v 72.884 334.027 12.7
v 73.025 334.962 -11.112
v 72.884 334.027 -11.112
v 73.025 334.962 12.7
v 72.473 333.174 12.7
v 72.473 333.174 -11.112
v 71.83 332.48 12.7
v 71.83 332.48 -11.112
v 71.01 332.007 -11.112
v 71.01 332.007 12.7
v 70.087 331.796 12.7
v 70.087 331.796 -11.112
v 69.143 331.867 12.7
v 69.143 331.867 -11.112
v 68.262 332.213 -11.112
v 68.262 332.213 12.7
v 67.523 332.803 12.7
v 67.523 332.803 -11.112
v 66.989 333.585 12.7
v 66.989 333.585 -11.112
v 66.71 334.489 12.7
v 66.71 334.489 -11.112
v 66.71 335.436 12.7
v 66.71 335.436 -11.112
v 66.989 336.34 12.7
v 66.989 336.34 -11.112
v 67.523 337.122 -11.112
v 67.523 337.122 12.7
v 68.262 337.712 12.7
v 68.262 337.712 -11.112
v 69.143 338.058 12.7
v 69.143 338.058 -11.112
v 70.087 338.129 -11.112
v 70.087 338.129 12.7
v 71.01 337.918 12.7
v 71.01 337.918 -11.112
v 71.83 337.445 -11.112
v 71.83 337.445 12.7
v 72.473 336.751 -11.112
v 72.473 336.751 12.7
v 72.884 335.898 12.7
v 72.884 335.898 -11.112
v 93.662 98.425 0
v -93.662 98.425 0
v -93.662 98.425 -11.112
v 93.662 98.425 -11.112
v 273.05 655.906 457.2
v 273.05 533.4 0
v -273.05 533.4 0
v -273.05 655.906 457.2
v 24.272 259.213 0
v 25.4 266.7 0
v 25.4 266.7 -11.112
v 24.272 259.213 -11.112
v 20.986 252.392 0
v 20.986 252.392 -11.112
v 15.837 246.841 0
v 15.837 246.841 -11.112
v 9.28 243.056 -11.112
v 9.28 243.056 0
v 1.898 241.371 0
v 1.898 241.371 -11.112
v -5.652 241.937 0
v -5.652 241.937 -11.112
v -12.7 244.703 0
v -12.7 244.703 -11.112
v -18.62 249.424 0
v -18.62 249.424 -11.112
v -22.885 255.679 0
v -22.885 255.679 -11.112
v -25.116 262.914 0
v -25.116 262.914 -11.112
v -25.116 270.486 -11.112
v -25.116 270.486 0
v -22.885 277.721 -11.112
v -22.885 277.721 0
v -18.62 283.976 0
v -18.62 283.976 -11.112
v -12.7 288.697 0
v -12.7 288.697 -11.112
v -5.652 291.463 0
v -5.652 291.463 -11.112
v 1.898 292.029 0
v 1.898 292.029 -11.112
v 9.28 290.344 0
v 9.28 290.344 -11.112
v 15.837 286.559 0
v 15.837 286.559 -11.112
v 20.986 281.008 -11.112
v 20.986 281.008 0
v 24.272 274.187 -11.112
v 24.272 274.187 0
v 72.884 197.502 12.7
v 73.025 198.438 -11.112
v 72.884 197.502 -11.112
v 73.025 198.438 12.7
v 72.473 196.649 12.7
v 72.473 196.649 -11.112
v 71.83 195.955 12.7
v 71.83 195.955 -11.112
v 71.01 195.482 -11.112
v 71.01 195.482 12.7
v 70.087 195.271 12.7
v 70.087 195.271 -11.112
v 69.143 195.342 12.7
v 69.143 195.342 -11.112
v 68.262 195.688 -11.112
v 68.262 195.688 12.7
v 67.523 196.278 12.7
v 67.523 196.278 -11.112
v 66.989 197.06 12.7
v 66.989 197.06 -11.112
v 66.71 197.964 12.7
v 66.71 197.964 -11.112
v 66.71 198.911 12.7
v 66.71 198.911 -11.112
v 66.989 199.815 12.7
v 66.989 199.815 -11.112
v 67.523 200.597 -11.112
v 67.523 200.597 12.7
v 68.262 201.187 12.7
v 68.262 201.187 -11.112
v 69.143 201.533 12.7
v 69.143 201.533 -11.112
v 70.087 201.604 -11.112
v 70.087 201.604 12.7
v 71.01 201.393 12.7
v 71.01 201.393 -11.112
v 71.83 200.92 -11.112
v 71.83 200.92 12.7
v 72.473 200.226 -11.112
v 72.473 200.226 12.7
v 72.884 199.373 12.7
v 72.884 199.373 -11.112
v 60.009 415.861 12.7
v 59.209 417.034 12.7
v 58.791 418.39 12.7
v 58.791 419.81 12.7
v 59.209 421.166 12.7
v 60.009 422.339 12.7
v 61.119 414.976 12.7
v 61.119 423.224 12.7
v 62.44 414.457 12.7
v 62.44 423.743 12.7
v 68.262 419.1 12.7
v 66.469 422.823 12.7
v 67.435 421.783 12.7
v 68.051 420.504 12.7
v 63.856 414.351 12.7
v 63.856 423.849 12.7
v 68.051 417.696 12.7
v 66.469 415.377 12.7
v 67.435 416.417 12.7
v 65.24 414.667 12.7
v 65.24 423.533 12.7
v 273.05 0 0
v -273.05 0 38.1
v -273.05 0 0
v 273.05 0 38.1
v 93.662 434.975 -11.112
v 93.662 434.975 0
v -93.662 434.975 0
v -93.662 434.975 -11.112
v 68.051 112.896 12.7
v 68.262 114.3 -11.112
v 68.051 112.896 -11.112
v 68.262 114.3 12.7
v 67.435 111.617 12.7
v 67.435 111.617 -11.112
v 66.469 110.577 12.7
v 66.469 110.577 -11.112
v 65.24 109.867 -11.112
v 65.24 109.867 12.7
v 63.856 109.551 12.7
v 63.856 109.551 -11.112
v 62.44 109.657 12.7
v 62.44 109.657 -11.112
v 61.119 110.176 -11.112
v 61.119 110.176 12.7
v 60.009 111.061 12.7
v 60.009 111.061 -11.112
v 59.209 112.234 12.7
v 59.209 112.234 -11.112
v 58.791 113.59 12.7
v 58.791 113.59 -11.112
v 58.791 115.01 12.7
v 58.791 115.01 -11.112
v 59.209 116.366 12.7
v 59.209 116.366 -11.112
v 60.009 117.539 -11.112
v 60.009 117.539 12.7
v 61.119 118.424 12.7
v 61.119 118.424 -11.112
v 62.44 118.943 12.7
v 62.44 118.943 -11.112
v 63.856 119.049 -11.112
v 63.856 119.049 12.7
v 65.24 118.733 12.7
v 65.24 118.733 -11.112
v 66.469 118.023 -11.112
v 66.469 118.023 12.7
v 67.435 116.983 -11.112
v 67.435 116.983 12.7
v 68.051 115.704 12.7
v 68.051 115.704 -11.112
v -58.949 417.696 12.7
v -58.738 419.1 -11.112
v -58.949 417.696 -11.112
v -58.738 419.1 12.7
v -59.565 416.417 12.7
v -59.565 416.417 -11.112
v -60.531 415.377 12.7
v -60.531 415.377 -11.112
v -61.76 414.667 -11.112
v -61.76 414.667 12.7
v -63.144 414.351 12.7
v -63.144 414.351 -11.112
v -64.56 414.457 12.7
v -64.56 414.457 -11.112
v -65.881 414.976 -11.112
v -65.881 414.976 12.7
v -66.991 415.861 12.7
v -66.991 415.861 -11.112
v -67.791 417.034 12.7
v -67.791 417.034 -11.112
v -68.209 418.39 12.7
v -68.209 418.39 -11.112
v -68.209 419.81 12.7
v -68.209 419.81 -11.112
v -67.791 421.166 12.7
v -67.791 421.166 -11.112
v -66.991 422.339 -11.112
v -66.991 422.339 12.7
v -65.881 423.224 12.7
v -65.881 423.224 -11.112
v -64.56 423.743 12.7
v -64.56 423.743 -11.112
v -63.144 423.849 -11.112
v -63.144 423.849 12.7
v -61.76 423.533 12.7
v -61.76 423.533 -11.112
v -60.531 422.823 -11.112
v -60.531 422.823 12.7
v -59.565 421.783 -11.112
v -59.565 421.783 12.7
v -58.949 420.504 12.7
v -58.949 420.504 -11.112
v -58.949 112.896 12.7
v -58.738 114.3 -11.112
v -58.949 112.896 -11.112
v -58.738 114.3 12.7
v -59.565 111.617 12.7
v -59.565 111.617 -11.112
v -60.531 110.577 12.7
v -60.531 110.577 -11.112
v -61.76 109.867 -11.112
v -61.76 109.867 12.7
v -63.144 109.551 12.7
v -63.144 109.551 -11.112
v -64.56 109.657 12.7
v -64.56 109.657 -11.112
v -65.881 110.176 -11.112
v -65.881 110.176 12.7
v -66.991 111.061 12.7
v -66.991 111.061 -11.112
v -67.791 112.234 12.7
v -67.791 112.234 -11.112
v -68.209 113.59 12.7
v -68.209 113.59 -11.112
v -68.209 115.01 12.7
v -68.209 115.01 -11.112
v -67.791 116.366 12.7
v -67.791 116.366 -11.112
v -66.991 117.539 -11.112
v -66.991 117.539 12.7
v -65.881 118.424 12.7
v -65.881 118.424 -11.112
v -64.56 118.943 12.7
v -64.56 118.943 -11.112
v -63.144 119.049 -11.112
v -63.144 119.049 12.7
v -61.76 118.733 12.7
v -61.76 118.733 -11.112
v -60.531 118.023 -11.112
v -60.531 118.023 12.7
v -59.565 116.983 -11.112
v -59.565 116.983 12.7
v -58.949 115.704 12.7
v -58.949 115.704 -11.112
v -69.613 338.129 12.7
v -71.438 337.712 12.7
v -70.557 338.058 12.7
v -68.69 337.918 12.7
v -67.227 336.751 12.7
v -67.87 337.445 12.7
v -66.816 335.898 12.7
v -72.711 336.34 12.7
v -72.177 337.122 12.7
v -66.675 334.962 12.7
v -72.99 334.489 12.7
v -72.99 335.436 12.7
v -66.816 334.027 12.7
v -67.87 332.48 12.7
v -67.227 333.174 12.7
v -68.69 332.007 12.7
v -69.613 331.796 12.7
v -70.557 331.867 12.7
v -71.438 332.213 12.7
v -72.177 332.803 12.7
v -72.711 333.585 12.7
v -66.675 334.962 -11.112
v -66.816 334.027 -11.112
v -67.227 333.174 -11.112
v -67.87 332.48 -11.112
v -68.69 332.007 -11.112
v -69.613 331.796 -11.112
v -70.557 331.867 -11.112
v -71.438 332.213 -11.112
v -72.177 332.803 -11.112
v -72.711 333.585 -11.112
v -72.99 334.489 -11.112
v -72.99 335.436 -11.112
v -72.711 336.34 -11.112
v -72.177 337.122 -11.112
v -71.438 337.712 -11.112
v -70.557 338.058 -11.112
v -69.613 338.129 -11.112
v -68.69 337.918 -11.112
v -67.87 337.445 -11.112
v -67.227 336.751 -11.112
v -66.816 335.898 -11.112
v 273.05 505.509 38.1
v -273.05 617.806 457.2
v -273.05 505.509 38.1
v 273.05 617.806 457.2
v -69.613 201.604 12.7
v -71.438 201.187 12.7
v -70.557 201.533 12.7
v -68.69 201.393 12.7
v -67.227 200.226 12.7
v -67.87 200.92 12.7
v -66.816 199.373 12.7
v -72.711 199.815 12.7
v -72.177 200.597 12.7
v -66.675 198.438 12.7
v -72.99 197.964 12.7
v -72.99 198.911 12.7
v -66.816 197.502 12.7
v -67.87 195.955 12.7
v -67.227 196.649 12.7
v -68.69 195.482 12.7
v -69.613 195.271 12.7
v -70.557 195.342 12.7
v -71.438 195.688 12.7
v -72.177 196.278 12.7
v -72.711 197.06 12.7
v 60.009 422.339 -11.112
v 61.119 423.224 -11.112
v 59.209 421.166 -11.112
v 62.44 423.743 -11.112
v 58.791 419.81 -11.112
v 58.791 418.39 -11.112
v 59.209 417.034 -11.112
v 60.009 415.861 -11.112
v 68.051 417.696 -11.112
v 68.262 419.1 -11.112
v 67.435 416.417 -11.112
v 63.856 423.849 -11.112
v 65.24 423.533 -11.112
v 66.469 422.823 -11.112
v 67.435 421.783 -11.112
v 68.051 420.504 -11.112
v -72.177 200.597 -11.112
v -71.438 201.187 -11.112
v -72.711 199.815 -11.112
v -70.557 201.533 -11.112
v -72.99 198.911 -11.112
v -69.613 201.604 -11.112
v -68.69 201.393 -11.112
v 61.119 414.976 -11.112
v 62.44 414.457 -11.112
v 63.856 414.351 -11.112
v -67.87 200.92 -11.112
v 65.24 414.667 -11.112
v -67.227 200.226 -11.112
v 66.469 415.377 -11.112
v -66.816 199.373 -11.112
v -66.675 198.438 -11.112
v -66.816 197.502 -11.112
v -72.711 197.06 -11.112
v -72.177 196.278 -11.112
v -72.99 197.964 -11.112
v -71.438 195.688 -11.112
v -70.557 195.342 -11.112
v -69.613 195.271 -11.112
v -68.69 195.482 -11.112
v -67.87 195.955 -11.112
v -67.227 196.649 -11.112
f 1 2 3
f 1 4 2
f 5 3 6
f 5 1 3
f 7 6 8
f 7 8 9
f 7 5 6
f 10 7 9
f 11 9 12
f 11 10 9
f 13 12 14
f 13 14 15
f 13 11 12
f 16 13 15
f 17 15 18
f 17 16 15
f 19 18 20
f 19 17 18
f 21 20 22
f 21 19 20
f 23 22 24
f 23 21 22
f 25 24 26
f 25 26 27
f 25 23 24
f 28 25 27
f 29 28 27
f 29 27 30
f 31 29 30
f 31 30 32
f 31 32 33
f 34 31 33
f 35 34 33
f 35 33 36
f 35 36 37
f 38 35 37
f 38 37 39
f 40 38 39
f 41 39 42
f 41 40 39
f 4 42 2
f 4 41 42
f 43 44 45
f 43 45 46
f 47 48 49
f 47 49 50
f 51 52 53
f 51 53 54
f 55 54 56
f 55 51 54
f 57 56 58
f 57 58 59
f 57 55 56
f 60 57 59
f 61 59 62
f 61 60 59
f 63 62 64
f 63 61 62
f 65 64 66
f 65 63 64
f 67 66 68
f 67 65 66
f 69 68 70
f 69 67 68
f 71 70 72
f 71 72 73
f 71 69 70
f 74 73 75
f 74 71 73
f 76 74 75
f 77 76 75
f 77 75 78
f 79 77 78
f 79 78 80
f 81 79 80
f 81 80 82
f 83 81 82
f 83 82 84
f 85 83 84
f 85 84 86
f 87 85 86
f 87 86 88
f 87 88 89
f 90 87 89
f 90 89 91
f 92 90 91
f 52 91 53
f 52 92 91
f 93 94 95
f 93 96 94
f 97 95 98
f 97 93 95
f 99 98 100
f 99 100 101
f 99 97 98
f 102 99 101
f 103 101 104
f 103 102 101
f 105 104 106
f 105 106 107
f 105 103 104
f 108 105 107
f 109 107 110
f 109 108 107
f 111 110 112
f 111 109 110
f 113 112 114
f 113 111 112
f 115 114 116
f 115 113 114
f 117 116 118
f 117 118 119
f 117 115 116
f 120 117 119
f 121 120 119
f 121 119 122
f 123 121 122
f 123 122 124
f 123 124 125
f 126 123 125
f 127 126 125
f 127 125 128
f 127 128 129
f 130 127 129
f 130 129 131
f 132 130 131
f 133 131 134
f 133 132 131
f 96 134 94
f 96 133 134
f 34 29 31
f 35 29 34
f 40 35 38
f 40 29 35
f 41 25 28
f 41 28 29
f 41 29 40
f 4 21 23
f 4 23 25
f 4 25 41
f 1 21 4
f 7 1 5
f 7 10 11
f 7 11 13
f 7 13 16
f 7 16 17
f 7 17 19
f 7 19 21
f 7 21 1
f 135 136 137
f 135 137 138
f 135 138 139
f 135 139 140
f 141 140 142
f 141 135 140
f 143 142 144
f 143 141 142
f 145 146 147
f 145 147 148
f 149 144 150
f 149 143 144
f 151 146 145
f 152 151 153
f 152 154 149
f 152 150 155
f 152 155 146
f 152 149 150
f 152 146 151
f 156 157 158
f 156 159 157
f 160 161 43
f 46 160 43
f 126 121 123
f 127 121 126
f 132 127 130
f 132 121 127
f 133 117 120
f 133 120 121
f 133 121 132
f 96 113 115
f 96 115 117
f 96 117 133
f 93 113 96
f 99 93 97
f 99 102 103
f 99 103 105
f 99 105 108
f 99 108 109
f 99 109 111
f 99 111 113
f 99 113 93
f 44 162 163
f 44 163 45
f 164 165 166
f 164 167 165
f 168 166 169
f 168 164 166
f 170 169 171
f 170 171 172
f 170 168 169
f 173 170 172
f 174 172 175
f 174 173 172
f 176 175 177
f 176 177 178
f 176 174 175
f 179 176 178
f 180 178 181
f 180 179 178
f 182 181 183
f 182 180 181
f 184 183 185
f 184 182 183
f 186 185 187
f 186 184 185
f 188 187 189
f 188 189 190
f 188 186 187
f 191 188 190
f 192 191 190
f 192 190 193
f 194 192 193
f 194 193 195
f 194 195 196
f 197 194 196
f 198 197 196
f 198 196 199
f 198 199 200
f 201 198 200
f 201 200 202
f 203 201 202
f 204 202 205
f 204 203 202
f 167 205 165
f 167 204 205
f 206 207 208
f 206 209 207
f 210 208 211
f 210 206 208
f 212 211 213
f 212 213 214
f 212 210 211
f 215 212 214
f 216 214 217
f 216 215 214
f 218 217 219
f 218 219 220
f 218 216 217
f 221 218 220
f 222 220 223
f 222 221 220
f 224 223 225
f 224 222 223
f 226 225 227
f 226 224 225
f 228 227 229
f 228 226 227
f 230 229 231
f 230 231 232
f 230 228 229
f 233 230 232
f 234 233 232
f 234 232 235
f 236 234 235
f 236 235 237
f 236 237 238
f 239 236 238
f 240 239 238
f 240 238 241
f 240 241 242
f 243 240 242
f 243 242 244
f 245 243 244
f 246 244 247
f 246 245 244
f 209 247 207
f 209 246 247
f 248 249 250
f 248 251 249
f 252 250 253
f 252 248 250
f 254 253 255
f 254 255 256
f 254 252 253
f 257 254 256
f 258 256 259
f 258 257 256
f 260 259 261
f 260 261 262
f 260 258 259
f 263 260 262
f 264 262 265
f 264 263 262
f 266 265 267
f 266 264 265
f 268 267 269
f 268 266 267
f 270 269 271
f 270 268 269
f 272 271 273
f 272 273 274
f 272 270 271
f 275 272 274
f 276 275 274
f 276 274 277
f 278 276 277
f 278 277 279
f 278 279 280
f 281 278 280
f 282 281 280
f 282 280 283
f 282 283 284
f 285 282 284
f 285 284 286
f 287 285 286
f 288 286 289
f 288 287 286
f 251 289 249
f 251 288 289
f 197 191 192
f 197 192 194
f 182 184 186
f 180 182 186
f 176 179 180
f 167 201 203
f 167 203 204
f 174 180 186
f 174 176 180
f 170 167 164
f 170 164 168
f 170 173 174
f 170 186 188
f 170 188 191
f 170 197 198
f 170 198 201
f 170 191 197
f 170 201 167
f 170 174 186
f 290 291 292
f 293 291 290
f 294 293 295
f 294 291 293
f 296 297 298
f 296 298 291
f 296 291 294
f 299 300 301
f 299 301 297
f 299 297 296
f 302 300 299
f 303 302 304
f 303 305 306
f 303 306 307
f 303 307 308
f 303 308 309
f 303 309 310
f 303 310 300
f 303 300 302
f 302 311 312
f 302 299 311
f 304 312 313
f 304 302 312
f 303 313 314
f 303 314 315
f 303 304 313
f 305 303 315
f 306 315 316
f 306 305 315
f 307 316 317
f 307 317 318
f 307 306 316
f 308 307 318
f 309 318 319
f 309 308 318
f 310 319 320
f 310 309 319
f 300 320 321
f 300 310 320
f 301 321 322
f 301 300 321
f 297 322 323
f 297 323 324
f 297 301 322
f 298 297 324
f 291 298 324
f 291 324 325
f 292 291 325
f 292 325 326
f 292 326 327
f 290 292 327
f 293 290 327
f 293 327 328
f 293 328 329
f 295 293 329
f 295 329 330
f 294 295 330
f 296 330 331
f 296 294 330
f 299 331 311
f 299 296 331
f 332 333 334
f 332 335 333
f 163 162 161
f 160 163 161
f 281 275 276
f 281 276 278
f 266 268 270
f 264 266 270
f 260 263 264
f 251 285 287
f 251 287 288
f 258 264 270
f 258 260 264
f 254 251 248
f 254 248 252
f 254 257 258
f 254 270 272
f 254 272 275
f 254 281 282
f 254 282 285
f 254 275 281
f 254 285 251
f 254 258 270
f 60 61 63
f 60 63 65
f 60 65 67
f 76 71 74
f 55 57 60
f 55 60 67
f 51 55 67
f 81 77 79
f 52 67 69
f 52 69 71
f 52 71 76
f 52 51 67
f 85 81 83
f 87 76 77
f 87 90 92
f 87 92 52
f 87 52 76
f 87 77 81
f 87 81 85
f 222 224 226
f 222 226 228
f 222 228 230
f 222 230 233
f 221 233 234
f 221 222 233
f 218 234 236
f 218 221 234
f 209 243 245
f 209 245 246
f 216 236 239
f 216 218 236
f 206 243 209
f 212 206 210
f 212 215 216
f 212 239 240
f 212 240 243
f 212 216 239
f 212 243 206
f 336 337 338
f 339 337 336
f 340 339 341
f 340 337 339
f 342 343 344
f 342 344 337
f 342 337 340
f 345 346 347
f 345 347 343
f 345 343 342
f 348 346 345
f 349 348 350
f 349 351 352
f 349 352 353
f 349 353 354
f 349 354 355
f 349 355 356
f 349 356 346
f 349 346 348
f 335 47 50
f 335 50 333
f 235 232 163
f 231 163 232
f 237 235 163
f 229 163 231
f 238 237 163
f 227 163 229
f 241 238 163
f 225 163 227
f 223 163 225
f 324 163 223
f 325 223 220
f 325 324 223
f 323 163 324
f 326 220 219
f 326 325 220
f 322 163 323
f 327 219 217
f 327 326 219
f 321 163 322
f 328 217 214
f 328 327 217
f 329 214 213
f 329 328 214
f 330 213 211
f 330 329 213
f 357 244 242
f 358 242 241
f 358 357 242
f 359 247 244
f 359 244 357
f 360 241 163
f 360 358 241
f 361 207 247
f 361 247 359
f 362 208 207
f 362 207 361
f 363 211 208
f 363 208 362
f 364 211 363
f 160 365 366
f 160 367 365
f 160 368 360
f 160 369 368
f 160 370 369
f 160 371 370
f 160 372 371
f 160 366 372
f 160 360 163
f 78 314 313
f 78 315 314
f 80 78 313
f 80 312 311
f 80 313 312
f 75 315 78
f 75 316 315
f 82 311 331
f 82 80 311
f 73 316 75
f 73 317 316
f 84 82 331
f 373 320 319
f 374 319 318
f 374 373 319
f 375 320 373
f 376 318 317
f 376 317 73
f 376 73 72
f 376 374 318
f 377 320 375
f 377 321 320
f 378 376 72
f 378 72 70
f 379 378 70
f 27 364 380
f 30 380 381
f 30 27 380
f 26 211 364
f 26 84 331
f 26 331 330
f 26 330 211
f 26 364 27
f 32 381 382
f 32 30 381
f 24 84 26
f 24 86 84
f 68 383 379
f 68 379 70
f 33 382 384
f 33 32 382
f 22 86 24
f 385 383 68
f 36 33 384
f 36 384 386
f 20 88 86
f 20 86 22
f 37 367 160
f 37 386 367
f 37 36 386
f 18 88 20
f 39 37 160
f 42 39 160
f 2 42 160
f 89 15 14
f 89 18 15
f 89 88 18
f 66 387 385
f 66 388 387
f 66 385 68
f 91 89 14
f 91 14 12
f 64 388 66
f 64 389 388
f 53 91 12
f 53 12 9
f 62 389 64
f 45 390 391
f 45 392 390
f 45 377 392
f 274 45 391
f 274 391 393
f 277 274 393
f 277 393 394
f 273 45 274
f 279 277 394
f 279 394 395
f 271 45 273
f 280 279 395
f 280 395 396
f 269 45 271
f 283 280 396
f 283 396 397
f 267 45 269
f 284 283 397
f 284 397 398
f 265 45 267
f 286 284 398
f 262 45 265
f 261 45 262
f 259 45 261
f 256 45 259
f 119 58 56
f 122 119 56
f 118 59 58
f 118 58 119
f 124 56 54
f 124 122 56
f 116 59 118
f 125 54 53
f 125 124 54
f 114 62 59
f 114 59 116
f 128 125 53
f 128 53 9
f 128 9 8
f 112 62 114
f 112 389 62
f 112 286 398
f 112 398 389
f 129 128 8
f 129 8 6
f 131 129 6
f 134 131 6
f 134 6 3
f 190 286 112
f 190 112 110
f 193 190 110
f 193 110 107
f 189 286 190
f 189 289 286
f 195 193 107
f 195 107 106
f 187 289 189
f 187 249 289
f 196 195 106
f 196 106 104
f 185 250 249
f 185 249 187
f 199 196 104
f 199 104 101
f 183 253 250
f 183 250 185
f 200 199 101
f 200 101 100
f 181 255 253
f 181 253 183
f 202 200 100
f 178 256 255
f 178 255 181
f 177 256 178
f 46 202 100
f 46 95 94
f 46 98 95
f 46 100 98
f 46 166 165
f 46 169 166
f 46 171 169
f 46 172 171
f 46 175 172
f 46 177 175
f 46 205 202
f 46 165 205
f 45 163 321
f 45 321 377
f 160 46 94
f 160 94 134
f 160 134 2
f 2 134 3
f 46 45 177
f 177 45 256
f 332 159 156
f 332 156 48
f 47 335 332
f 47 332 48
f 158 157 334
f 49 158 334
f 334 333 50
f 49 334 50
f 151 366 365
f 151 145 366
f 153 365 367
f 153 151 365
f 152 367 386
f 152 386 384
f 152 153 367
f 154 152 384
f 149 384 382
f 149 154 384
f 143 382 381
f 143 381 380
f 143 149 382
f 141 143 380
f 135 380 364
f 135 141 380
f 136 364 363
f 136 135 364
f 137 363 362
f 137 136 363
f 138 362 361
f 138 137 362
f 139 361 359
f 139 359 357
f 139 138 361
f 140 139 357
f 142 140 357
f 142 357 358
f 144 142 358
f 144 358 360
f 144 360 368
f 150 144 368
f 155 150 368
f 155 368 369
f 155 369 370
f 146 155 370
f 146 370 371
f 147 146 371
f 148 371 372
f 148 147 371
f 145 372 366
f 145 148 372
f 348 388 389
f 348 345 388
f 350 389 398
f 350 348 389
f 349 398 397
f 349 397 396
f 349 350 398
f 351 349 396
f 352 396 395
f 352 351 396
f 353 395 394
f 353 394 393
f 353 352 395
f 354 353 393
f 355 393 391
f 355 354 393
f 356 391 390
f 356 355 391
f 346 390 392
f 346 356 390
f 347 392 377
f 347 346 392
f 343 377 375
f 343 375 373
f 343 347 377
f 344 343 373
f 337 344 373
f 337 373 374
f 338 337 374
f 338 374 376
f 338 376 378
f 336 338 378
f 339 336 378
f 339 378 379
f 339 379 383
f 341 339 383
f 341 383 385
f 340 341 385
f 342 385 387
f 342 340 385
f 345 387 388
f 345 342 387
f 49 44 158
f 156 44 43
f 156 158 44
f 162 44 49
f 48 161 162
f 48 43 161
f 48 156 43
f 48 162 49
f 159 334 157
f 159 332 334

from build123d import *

# Parameters (mm, degrees)
F1_DEPTH      = 273.05
F1_DEPTH_BACK = 273.05
F2_R          = 4.7625
F2_R_2        = 3.175
F3_DEPTH      = 12.7
F4_W          = 187.325
F4_H          = 336.55
F4_R          = 4.7625
F4_R_2        = 3.175
F4_R_3        = 25.4
F5_DEPTH      = 11.1125


with BuildPart() as f1:
    # F0 (on Right) → F1 (new body, two sides)
    with BuildSketch(Plane.YZ) as f1_sk:
        Polygon((0, 38.1), (0, 0), (533.4, 0), (655.906371, 457.2), (617.806371, 457.2), (505.508864, 38.1), align=None)
    extrude(amount=F1_DEPTH)
    extrude(f1_sk.sketch, amount=-F1_DEPTH_BACK)

    # F2 (on face) → F3 (cut)
    with BuildSketch(Plane(origin=(0, 0, 0), x_dir=(1, 0, 0), z_dir=(0, 0, -1))):
        with Locations((-63.5, -114.3)):
            Circle(F2_R)
        with Locations((-63.5, -419.1)):
            Circle(F2_R)
        with Locations((63.5, -419.1)):
            Circle(F2_R)
        with Locations((69.85, -334.9625)):
            Circle(F2_R_2)
        with Locations((69.85, -198.4375)):
            Circle(F2_R_2)
        with Locations((-69.85, -198.4375)):
            Circle(F2_R_2)
        with Locations((-69.85, -334.9625)):
            Circle(F2_R_2)
        with Locations((63.5, -114.3)):
            Circle(F2_R)
    extrude(amount=-F3_DEPTH, mode=Mode.SUBTRACT)

    # F4 (on face) → F5 (join)
    with BuildSketch(Plane(origin=(0, 0, 0), x_dir=(1, 0, 0), z_dir=(0, 0, -1))):
        with Locations((0, -266.7)):
            Rectangle(F4_W, F4_H)
        with Locations((-63.5, -419.1)):
            Circle(F4_R, mode=Mode.SUBTRACT)
        with Locations((-69.85, -334.9625)):
            Circle(F4_R_2, mode=Mode.SUBTRACT)
        with Locations((63.5, -419.1)):
            Circle(F4_R, mode=Mode.SUBTRACT)
        with Locations((69.85, -334.9625)):
            Circle(F4_R_2, mode=Mode.SUBTRACT)
        with Locations((-69.85, -198.4375)):
            Circle(F4_R_2, mode=Mode.SUBTRACT)
        with Locations((-63.5, -114.3)):
            Circle(F4_R, mode=Mode.SUBTRACT)
        with Locations((0, -266.7)):
            Circle(F4_R_3, mode=Mode.SUBTRACT)
        with Locations((69.85, -198.4375)):
            Circle(F4_R_2, mode=Mode.SUBTRACT)
        with Locations((63.5, -114.3)):
            Circle(F4_R, mode=Mode.SUBTRACT)
    extrude(amount=F5_DEPTH)


solid = f1.part
